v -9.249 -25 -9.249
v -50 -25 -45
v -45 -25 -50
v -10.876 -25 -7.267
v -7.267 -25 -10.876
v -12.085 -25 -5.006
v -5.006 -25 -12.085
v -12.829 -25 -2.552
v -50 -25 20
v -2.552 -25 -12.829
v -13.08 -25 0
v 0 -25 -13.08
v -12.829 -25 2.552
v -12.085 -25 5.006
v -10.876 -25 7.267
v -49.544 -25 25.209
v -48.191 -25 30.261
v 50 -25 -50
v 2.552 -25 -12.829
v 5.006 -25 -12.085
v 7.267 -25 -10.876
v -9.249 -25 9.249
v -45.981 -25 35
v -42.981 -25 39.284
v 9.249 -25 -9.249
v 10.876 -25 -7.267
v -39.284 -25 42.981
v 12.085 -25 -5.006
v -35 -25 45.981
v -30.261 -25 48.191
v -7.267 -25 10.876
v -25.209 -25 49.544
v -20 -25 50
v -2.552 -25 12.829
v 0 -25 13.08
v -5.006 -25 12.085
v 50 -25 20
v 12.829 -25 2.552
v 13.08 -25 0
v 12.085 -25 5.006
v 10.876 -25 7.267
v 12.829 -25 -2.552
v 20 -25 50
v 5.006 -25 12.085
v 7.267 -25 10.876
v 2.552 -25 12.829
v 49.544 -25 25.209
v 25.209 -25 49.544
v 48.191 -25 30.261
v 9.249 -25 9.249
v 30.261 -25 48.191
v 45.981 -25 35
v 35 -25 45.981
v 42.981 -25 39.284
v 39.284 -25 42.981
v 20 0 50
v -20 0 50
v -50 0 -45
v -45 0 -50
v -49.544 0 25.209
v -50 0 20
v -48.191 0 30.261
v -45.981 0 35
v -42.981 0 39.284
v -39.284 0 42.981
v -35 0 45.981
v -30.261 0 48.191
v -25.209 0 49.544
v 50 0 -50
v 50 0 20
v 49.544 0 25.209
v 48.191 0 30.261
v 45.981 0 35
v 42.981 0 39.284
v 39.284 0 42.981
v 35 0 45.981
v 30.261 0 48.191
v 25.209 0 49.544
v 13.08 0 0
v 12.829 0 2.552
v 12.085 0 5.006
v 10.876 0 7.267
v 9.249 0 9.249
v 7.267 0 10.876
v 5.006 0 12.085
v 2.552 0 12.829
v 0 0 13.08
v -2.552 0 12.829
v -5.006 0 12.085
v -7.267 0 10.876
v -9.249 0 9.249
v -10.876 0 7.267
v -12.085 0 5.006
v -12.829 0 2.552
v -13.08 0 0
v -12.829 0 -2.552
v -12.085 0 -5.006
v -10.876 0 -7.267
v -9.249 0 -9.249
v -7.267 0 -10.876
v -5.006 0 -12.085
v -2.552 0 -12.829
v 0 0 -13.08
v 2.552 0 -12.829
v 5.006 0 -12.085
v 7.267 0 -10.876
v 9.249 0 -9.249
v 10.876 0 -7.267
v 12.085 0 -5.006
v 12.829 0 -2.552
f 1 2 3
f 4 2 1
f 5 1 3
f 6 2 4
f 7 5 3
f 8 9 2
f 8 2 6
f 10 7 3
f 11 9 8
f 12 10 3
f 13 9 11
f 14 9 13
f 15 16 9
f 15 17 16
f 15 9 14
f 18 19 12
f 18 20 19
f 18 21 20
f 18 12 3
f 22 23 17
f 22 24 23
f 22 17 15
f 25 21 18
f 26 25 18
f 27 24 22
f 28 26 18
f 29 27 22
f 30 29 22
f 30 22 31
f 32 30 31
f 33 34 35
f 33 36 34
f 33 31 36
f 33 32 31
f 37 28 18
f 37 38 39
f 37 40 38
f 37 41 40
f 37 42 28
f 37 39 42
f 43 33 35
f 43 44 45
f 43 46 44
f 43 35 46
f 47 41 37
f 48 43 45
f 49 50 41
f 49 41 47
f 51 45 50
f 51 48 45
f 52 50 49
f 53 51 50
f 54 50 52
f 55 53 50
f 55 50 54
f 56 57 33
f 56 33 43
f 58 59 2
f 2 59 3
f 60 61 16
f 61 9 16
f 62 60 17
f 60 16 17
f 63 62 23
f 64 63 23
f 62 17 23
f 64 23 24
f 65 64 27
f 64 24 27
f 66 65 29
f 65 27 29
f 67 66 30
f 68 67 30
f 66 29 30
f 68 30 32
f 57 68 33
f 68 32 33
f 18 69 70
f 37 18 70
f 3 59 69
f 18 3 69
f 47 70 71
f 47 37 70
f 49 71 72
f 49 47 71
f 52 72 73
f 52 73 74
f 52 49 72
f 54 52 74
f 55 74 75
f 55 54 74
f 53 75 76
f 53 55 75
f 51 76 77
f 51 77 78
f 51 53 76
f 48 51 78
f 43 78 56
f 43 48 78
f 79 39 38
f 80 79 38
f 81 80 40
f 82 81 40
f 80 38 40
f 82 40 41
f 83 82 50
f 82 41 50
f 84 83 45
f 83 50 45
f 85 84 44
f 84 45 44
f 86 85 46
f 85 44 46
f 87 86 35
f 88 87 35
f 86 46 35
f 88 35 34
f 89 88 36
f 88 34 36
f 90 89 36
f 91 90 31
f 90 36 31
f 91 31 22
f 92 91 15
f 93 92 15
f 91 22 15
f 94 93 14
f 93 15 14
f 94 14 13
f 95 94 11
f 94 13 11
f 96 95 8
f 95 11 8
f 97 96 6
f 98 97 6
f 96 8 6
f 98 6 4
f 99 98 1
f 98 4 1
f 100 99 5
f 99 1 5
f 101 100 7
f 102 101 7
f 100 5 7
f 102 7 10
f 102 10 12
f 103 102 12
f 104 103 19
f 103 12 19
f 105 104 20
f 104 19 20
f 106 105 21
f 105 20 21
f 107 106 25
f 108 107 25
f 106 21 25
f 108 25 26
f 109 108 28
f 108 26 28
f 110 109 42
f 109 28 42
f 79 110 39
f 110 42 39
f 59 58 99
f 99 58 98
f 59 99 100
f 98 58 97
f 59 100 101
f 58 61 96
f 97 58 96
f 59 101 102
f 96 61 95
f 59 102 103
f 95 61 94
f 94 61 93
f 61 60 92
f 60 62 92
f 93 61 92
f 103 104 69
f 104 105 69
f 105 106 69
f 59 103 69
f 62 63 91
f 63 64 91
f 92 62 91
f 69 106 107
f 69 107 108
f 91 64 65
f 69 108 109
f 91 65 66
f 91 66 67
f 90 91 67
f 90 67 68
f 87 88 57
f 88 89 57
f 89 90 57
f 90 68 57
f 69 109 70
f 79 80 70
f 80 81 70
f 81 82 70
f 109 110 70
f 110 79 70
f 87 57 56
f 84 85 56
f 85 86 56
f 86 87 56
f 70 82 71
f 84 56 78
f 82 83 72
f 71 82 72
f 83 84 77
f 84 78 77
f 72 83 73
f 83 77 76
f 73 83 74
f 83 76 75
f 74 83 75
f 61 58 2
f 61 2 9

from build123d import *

# Parameters (mm, degrees)
F0_W     = 100
F0_H     = 100
F1_DEPTH = 25
F2_R     = 30
F3_SIZE  = 5
F4_R     = 13.080351
F5_DEPTH = 25


with BuildPart() as f1:
    # F0 (on Front) → F1 (new body)
    with BuildSketch(Plane.XZ):
        Rectangle(F0_W, F0_H)
    extrude(amount=F1_DEPTH)

    # F2
    f2_edges = [f1.edges().sort_by_distance(p)[0] for p in [
        (-50, -12.5, 50),
        (50, -12.5, 50),
    ]]
    fillet(f2_edges, radius=F2_R)

    # F3
    f3_edges = [f1.edges().sort_by_distance(p)[0] for p in [
        (-50, -12.5, -50),
    ]]
    chamfer(f3_edges, length=F3_SIZE)

    # F4 (on face) → F5 (cut)
    with BuildSketch(Plane.XZ.offset(25)):
        Circle(F4_R)
    extrude(amount=-F5_DEPTH, mode=Mode.SUBTRACT)


solid = f1.part
